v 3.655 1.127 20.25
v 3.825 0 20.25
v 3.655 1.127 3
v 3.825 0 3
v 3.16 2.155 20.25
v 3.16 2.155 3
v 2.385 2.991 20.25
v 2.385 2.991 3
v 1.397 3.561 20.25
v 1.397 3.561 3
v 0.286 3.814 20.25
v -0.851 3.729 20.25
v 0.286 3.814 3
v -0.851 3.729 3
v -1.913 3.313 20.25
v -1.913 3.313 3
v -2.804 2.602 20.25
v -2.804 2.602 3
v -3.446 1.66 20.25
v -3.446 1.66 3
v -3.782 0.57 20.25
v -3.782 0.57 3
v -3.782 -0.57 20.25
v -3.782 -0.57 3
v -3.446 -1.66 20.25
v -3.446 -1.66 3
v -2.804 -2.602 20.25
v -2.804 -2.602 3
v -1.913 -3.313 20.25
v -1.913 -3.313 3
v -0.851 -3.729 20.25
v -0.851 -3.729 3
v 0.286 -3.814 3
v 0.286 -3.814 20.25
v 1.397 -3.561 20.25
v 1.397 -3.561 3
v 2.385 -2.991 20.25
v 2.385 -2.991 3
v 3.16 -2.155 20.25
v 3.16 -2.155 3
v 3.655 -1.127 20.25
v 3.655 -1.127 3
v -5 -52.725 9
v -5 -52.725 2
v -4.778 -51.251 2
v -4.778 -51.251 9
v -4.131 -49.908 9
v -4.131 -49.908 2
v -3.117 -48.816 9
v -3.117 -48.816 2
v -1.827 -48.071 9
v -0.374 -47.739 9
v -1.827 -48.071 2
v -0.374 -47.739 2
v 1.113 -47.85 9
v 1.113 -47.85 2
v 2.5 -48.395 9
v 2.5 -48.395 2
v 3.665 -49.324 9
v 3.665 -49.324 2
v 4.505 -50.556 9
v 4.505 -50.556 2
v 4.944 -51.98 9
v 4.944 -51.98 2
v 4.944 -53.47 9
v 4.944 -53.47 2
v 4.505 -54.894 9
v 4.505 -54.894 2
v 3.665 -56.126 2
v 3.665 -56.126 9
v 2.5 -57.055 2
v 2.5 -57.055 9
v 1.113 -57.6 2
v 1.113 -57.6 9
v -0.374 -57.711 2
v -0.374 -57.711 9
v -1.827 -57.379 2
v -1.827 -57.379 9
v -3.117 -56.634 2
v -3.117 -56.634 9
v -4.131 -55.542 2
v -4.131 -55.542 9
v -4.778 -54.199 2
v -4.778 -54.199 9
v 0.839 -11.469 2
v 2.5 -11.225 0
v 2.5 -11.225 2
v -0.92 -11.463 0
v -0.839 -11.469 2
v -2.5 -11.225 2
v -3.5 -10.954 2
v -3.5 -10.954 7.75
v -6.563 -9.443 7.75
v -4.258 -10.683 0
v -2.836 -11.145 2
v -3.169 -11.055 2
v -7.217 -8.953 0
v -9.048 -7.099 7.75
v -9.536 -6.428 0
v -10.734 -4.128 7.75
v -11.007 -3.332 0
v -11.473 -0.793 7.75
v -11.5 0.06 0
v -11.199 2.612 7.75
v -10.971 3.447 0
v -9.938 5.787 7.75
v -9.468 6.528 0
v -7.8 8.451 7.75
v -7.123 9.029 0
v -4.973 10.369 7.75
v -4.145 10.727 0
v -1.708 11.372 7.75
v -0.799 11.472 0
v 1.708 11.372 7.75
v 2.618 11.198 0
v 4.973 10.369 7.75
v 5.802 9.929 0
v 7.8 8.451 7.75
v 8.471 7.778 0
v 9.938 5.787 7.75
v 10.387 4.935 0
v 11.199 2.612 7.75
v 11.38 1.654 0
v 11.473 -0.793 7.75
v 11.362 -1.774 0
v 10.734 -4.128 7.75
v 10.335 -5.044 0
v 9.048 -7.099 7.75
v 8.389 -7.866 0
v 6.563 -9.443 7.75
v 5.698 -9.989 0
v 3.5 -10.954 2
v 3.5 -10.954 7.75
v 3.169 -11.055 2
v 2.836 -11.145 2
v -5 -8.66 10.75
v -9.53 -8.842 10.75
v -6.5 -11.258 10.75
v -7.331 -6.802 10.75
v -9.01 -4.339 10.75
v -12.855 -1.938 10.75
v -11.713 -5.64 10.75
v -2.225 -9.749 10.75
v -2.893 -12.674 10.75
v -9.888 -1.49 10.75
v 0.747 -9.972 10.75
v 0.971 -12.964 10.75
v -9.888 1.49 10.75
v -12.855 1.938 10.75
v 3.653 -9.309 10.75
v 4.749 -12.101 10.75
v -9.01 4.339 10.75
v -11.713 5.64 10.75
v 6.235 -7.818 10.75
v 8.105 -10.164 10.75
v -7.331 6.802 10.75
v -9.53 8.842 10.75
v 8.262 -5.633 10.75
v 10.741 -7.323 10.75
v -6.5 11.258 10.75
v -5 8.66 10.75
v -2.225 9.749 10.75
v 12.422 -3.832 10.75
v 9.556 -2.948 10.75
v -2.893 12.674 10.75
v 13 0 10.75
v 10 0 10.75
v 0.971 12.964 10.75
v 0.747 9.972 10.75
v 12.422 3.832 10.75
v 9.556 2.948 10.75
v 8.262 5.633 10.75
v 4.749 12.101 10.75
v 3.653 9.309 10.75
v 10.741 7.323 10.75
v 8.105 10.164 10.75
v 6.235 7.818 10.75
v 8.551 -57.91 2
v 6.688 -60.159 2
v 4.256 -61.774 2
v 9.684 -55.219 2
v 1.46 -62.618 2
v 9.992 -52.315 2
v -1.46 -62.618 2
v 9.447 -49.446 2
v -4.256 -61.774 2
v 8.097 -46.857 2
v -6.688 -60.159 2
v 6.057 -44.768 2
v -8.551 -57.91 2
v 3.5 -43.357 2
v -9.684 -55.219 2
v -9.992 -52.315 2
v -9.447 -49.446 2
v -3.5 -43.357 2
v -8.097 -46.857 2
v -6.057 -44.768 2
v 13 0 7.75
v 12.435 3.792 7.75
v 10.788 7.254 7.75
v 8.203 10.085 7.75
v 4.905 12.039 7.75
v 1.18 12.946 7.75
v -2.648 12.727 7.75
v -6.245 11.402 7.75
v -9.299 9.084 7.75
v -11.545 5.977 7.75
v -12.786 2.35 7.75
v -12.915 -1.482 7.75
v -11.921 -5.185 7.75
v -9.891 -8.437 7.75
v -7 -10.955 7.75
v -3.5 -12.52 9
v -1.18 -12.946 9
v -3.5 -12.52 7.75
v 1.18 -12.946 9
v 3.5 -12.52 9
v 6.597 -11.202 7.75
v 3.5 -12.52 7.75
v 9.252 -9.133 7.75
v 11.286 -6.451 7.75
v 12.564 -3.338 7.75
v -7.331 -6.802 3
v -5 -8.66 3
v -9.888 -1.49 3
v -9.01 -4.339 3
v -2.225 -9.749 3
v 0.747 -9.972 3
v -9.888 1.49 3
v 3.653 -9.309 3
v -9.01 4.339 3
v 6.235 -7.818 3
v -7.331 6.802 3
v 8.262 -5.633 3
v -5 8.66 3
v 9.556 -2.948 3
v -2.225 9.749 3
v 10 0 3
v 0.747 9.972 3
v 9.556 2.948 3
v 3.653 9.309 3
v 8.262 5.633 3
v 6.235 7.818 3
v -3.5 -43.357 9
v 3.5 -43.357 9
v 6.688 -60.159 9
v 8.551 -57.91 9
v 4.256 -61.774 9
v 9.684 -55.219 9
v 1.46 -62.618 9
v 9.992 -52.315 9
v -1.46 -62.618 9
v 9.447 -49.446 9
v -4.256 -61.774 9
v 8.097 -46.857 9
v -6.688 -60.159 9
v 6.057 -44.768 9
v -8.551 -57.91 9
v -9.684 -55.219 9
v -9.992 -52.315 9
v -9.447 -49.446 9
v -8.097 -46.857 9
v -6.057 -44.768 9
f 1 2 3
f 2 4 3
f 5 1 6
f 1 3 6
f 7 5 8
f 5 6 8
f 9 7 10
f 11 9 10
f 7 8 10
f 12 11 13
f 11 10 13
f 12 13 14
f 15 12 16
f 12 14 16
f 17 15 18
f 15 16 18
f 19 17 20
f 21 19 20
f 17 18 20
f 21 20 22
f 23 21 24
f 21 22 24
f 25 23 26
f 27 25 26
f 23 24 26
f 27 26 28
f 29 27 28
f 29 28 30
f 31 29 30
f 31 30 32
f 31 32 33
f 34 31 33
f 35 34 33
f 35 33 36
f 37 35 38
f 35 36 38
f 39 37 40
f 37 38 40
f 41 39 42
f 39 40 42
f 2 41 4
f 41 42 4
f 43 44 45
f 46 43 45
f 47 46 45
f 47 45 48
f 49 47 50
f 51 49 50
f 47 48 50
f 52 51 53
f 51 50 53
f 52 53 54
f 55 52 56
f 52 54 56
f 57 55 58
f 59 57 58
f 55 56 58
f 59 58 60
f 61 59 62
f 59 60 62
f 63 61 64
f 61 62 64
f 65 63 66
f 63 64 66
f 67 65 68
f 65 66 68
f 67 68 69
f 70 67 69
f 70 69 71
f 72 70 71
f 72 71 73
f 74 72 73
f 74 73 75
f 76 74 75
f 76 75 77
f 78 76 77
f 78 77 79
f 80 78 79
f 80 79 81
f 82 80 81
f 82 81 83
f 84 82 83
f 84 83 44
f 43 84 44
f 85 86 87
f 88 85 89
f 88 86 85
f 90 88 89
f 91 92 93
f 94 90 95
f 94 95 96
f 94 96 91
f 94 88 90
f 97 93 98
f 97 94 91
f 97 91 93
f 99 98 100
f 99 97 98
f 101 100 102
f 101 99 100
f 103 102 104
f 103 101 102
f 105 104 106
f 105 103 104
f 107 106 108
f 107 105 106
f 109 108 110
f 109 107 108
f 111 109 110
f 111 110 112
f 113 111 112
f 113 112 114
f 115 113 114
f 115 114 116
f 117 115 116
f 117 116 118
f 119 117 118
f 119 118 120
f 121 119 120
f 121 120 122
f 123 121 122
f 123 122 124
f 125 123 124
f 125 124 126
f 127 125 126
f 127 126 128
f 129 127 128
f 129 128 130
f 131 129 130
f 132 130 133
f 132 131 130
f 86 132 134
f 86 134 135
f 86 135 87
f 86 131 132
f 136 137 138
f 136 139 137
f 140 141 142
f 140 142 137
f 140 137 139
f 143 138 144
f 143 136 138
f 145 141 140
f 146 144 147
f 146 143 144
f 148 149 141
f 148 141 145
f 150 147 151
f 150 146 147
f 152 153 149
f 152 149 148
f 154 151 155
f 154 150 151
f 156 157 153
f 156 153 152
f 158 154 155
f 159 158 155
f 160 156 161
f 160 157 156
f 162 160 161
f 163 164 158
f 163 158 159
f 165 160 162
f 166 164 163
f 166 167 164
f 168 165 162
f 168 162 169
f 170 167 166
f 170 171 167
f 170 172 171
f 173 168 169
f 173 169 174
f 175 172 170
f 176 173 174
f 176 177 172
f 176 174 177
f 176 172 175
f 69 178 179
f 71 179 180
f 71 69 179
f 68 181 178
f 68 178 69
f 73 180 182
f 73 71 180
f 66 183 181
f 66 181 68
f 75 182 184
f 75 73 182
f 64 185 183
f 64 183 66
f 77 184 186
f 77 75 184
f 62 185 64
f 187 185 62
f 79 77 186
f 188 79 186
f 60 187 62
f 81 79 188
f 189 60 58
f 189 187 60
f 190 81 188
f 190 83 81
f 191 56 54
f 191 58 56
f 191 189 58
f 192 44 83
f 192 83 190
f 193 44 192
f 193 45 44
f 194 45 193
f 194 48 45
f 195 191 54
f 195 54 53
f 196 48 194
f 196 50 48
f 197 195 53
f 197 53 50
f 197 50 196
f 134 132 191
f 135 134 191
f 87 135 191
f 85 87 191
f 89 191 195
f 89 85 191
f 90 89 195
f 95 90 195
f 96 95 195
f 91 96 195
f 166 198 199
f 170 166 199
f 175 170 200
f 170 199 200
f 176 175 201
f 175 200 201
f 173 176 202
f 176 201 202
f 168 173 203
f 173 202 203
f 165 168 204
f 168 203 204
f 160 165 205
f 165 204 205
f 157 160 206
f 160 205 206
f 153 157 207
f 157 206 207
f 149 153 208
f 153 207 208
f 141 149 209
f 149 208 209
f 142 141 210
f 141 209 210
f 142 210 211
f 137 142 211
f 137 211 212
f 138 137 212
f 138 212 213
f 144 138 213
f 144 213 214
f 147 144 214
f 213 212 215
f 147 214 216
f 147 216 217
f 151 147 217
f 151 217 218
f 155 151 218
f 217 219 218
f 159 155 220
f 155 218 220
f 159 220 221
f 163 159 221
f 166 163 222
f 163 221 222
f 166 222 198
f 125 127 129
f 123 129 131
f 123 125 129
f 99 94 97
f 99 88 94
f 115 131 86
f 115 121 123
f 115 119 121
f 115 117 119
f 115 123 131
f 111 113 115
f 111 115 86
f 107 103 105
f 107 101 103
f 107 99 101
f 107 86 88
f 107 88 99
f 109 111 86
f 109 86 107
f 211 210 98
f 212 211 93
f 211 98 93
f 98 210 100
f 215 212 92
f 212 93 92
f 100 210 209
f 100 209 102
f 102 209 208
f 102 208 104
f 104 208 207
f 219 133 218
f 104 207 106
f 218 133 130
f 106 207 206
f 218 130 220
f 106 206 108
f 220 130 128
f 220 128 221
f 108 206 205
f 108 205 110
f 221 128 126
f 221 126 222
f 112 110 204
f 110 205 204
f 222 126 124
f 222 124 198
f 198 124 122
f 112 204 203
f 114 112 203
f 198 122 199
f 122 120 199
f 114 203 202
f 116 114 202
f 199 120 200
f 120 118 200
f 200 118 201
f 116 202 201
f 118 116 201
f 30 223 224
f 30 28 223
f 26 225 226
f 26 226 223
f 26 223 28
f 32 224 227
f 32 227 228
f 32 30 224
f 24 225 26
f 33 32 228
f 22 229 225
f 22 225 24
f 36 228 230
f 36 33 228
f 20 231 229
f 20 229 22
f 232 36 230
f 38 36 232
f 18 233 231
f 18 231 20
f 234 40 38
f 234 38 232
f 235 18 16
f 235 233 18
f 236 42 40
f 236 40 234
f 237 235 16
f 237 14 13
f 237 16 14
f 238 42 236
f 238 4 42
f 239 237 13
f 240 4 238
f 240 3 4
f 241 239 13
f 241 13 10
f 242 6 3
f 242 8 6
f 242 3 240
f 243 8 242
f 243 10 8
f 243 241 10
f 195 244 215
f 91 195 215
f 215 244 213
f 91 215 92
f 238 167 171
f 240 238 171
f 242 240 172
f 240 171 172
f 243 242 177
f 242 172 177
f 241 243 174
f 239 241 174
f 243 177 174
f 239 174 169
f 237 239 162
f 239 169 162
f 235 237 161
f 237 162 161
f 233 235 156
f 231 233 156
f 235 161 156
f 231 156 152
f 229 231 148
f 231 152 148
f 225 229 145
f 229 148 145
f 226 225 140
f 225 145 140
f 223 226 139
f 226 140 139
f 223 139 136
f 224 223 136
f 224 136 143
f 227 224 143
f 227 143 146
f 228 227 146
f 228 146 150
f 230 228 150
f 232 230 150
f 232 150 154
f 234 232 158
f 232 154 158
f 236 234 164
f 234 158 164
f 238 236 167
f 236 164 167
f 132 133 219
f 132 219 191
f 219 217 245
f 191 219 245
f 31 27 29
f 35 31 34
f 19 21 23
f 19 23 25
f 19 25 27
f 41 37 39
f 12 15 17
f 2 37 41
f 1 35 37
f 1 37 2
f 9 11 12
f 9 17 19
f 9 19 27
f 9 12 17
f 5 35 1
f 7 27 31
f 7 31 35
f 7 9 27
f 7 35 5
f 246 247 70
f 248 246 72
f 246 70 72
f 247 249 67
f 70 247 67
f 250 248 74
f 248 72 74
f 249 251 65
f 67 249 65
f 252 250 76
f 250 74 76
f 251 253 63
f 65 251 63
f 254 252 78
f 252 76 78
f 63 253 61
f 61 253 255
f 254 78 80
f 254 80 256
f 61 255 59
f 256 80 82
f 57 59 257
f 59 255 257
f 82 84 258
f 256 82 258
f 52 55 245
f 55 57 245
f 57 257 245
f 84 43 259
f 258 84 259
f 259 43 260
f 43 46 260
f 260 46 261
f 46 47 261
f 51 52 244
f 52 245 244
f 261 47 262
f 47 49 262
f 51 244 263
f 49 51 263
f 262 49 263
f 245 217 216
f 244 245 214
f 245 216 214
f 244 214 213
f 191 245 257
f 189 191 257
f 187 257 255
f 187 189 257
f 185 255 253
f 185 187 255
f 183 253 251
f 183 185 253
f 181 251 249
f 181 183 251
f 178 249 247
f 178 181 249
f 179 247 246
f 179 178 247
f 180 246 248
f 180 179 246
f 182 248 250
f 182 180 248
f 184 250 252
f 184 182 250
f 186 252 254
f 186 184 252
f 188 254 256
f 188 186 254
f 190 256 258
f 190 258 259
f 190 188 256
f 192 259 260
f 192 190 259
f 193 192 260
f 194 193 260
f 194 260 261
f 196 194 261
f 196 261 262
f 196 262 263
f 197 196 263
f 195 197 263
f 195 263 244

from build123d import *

# Parameters (mm, degrees)
CROQUIS1_R               = 10
SALIENTE_EXTRUIR1_DEPTH  = 3
CROQUIS2_R               = 11.5
CROQUIS2_R_2             = 10
SALIENTE_EXTRUIR3_DEPTH  = 8
SALIENTE_EXTRUIR4_START  = 3
CROQUIS3_R               = 11.5
CROQUIS3_R_2             = 10
SALIENTE_EXTRUIR4_DEPTH  = 3
SALIENTE_EXTRUIR5_DEPTH  = 8
CROQUIS11_W              = 0.560242515
CROQUIS11_H              = 6
CORTAR_EXTRUIR3_DEPTH    = 8
CROQUIS12_W              = 2.5
CROQUIS12_H              = 0.622045166
SALIENTE_EXTRUIR6_DEPTH  = 3
CROQUIS13_W              = 5
CROQUIS13_H              = 50.27502784
SALIENTE_EXTRUIR7_DEPTH  = 8
CROQUIS15_W              = 2
CROQUIS15_H              = 50.27502784
CORTAR_EXTRUIR4_DEPTH    = 8
SALIENTE_EXTRUIR8_DEPTH  = 7
CROQUIS21_R              = 10
SALIENTE_EXTRUIR9_DEPTH  = 7
CROQUIS22_R              = 5
CORTAR_EXTRUIR5_DEPTH    = 30
CROQUIS23_R              = 10
SALIENTE_EXTRUIR10_DEPTH = 1.25
CORTAR_EXTRUIR6_START    = -1.5
CROQUIS24_R              = 10
CORTAR_EXTRUIR6_DEPTH    = 1.5
SALIENTE_EXTRUIR11_START = -3
CROQUIS25_R              = 13
SALIENTE_EXTRUIR11_DEPTH = 3
CORTAR_EXTRUIR14_START   = -10
CROQUIS30_R              = 10
CORTAR_EXTRUIR14_DEPTH   = 10
CROQUIS31_R              = 11.5
CROQUIS31_R_2            = 10
SALIENTE_EXTRUIR12_DEPTH = 7.75
CROQUIS32_R              = 10
SALIENTE_EXTRUIR13_DEPTH = 10.75
CROQUIS34_R              = 10
CORTAR_EXTRUIR15_DEPTH   = 7.75
CROQUIS36_R              = 3.825
SALIENTE_EXTRUIR14_DEPTH = 7.75
CROQUIS37_R              = 3.825
SALIENTE_EXTRUIR15_DEPTH = 9.5


with BuildPart() as part:
    # Croquis1 → Saliente-Extruir1 (new body)
    with BuildSketch(Plane.XY):
        Circle(CROQUIS1_R)
    extrude(amount=SALIENTE_EXTRUIR1_DEPTH)



with BuildPart() as body_2:
    # Croquis2 → Saliente-Extruir3 (new body)
    with BuildSketch(Plane.XY.offset(3)):
        Circle(CROQUIS2_R)
        Circle(CROQUIS2_R_2, mode=Mode.SUBTRACT)
    extrude(amount=SALIENTE_EXTRUIR3_DEPTH)


with BuildPart() as part_1:
    add(part.part)

    add(body_2.part)  # Saliente-Extruir4 merges body 2
    # Croquis3 → Saliente-Extruir4 (add)
    with BuildSketch(Plane(origin=(0, 0, 3), x_dir=(-1, 0, 0), z_dir=(0, 0, -1)).offset(SALIENTE_EXTRUIR4_START)):
        with Locations(Location((0, 0, 0), (0, 0, 180))):
            Circle(CROQUIS3_R)
        with Locations(Location((0, 0, 0), (0, 0, 180))):
            Circle(CROQUIS3_R_2, mode=Mode.SUBTRACT)
    extrude(amount=-SALIENTE_EXTRUIR4_DEPTH)

    # Croquis12 → Saliente-Extruir6 (add)
    with BuildSketch(Plane.XY.offset(3)):
        with Locations((-1.25, -11.188977417)):
            Rectangle(CROQUIS12_W, CROQUIS12_H)
        with Locations((1.25, -11.188977417)):
            Rectangle(CROQUIS12_W, CROQUIS12_H)
        Polygon((2.5, -11.5), (2.5, -61.5), (-2.5, -61.5), (-2.5, -11.5), (0, -11.5), align=None)
    extrude(amount=-SALIENTE_EXTRUIR6_DEPTH)

    # Croquis13 → Saliente-Extruir7 (add)
    with BuildSketch(Plane.XY.offset(3)):
        with Locations((0, -36.36248608)):
            Rectangle(CROQUIS13_W, CROQUIS13_H)
    extrude(amount=SALIENTE_EXTRUIR7_DEPTH)

    # Croquis15 → Cortar-Extruir4 (cut)
    with BuildSketch(Plane(origin=(2.5, 0, 0), x_dir=(0, 0, -1), z_dir=(1, 0, 0))):
        with Locations((-10, -36.36248608)):
            Rectangle(CROQUIS15_W, CROQUIS15_H)
        with Locations((-1, -36.36248608)):
            Rectangle(CROQUIS15_W, CROQUIS15_H)
    extrude(amount=-CORTAR_EXTRUIR4_DEPTH, mode=Mode.SUBTRACT)

    # Croquis16 → Saliente-Extruir8 (add)
    with BuildSketch(Plane.XY.offset(9)):
        Polygon((-2.5, -61.5), (-3.5, -61.5), (-3.5, -10.232955502), (3.5, -10.232955502), (3.5, -61.5), (2.5, -61.5), align=None)
    extrude(amount=-SALIENTE_EXTRUIR8_DEPTH)

    # Croquis21 → Saliente-Extruir9 (add)
    with BuildSketch(Plane(origin=(0, 0, 2), x_dir=(-1, 0, 0), z_dir=(0, 0, -1))):
        with Locations((0, -52.72497216)):
            Circle(CROQUIS21_R)
    extrude(amount=-SALIENTE_EXTRUIR9_DEPTH)

    # Croquis22 → Cortar-Extruir5 (cut)
    with BuildSketch(Plane(origin=(0, 0, 2), x_dir=(-1, 0, 0), z_dir=(0, 0, -1))):
        with Locations((0, -52.72497216)):
            Circle(CROQUIS22_R)
    extrude(amount=-CORTAR_EXTRUIR5_DEPTH, mode=Mode.SUBTRACT)

    # Croquis23 → Saliente-Extruir10 (add)
    with BuildSketch(Plane.XY.offset(11)):
        with BuildLine():
            Line((-2.5, -11.22497216), (2.5, -11.22497216))
            ThreePointArc((2.5, -11.22497216), (0, 11.5), (-2.5, -11.22497216))
        make_face()
        Circle(CROQUIS23_R, mode=Mode.SUBTRACT)
    extrude(amount=SALIENTE_EXTRUIR10_DEPTH)

    # Croquis24 → Cortar-Extruir6 (cut)
    with BuildSketch(Plane.XY.offset(12.25).offset(CORTAR_EXTRUIR6_START)):
        with BuildLine():
            Line((-2.5, -11.22497216), (2.5, -11.22497216))
            ThreePointArc((2.5, -11.22497216), (0, 11.5), (-2.5, -11.22497216))
        make_face()
        Circle(CROQUIS24_R, mode=Mode.SUBTRACT)
    extrude(amount=CORTAR_EXTRUIR6_DEPTH, mode=Mode.SUBTRACT)

    # Croquis25 → Saliente-Extruir11 (add)
    with BuildSketch(Plane.XY.offset(10.75).offset(SALIENTE_EXTRUIR11_START)):
        Circle(CROQUIS25_R)
        with BuildLine():
            ThreePointArc((2.5, -11.22497216), (0, 11.5), (-2.5, -11.22497216))
            Line((-2.5, -11.22497216), (2.5, -11.22497216))
        make_face(mode=Mode.SUBTRACT)
    extrude(amount=SALIENTE_EXTRUIR11_DEPTH)

    # Croquis30 → Cortar-Extruir14 (cut)
    with BuildSketch(Plane.XY.offset(3).offset(CORTAR_EXTRUIR14_START)):
        Circle(CROQUIS30_R)
    extrude(amount=CORTAR_EXTRUIR14_DEPTH, mode=Mode.SUBTRACT)

    # Croquis31 → Saliente-Extruir12 (add)
    with BuildSketch(Plane(origin=(0, 0, 0), x_dir=(-1, 0, 0), z_dir=(0, 0, -1))):
        with Locations(Location((0, 0, 0), (0, 0, 180))):
            Circle(CROQUIS31_R)
        with Locations(Location((0, 0, 0), (0, 0, 180))):
            Circle(CROQUIS31_R_2, mode=Mode.SUBTRACT)
    extrude(amount=-SALIENTE_EXTRUIR12_DEPTH)

    # Croquis32 → Saliente-Extruir13 (add)
    with BuildSketch(Plane(origin=(0, 0, 0), x_dir=(-1, 0, 0), z_dir=(0, 0, -1))):
        Circle(CROQUIS32_R)
    extrude(amount=-SALIENTE_EXTRUIR13_DEPTH)

    # Croquis34 → Cortar-Extruir15 (cut)
    with BuildSketch(Plane.XY.offset(10.75)):
        Circle(CROQUIS34_R)
    extrude(amount=-CORTAR_EXTRUIR15_DEPTH, mode=Mode.SUBTRACT)

    # Croquis36 → Saliente-Extruir14 (add)
    with BuildSketch(Plane.XY.offset(3)):
        Circle(CROQUIS36_R)
    extrude(amount=SALIENTE_EXTRUIR14_DEPTH)

    # Croquis37 → Saliente-Extruir15 (add)
    with BuildSketch(Plane.XY.offset(10.75)):
        Circle(CROQUIS37_R)
    extrude(amount=SALIENTE_EXTRUIR15_DEPTH)


with BuildPart() as body_2_2:
    # Croquis9 → Saliente-Extruir5 (new body)
    with BuildSketch(Plane.XY.offset(11)):
        Polygon((11.5, 0), (11.5, 3), (12.060242515, 3), (12.060242515, -3), (11.5, -3), align=None)
    extrude(amount=-SALIENTE_EXTRUIR5_DEPTH)

    # Croquis11 → Cortar-Extruir3 (cut)
    with BuildSketch(Plane.XY.offset(11)):
        with Locations((11.780121257, 0)):
            Rectangle(CROQUIS11_W, CROQUIS11_H)
    extrude(amount=-CORTAR_EXTRUIR3_DEPTH, mode=Mode.SUBTRACT)


solid = part_1.part
